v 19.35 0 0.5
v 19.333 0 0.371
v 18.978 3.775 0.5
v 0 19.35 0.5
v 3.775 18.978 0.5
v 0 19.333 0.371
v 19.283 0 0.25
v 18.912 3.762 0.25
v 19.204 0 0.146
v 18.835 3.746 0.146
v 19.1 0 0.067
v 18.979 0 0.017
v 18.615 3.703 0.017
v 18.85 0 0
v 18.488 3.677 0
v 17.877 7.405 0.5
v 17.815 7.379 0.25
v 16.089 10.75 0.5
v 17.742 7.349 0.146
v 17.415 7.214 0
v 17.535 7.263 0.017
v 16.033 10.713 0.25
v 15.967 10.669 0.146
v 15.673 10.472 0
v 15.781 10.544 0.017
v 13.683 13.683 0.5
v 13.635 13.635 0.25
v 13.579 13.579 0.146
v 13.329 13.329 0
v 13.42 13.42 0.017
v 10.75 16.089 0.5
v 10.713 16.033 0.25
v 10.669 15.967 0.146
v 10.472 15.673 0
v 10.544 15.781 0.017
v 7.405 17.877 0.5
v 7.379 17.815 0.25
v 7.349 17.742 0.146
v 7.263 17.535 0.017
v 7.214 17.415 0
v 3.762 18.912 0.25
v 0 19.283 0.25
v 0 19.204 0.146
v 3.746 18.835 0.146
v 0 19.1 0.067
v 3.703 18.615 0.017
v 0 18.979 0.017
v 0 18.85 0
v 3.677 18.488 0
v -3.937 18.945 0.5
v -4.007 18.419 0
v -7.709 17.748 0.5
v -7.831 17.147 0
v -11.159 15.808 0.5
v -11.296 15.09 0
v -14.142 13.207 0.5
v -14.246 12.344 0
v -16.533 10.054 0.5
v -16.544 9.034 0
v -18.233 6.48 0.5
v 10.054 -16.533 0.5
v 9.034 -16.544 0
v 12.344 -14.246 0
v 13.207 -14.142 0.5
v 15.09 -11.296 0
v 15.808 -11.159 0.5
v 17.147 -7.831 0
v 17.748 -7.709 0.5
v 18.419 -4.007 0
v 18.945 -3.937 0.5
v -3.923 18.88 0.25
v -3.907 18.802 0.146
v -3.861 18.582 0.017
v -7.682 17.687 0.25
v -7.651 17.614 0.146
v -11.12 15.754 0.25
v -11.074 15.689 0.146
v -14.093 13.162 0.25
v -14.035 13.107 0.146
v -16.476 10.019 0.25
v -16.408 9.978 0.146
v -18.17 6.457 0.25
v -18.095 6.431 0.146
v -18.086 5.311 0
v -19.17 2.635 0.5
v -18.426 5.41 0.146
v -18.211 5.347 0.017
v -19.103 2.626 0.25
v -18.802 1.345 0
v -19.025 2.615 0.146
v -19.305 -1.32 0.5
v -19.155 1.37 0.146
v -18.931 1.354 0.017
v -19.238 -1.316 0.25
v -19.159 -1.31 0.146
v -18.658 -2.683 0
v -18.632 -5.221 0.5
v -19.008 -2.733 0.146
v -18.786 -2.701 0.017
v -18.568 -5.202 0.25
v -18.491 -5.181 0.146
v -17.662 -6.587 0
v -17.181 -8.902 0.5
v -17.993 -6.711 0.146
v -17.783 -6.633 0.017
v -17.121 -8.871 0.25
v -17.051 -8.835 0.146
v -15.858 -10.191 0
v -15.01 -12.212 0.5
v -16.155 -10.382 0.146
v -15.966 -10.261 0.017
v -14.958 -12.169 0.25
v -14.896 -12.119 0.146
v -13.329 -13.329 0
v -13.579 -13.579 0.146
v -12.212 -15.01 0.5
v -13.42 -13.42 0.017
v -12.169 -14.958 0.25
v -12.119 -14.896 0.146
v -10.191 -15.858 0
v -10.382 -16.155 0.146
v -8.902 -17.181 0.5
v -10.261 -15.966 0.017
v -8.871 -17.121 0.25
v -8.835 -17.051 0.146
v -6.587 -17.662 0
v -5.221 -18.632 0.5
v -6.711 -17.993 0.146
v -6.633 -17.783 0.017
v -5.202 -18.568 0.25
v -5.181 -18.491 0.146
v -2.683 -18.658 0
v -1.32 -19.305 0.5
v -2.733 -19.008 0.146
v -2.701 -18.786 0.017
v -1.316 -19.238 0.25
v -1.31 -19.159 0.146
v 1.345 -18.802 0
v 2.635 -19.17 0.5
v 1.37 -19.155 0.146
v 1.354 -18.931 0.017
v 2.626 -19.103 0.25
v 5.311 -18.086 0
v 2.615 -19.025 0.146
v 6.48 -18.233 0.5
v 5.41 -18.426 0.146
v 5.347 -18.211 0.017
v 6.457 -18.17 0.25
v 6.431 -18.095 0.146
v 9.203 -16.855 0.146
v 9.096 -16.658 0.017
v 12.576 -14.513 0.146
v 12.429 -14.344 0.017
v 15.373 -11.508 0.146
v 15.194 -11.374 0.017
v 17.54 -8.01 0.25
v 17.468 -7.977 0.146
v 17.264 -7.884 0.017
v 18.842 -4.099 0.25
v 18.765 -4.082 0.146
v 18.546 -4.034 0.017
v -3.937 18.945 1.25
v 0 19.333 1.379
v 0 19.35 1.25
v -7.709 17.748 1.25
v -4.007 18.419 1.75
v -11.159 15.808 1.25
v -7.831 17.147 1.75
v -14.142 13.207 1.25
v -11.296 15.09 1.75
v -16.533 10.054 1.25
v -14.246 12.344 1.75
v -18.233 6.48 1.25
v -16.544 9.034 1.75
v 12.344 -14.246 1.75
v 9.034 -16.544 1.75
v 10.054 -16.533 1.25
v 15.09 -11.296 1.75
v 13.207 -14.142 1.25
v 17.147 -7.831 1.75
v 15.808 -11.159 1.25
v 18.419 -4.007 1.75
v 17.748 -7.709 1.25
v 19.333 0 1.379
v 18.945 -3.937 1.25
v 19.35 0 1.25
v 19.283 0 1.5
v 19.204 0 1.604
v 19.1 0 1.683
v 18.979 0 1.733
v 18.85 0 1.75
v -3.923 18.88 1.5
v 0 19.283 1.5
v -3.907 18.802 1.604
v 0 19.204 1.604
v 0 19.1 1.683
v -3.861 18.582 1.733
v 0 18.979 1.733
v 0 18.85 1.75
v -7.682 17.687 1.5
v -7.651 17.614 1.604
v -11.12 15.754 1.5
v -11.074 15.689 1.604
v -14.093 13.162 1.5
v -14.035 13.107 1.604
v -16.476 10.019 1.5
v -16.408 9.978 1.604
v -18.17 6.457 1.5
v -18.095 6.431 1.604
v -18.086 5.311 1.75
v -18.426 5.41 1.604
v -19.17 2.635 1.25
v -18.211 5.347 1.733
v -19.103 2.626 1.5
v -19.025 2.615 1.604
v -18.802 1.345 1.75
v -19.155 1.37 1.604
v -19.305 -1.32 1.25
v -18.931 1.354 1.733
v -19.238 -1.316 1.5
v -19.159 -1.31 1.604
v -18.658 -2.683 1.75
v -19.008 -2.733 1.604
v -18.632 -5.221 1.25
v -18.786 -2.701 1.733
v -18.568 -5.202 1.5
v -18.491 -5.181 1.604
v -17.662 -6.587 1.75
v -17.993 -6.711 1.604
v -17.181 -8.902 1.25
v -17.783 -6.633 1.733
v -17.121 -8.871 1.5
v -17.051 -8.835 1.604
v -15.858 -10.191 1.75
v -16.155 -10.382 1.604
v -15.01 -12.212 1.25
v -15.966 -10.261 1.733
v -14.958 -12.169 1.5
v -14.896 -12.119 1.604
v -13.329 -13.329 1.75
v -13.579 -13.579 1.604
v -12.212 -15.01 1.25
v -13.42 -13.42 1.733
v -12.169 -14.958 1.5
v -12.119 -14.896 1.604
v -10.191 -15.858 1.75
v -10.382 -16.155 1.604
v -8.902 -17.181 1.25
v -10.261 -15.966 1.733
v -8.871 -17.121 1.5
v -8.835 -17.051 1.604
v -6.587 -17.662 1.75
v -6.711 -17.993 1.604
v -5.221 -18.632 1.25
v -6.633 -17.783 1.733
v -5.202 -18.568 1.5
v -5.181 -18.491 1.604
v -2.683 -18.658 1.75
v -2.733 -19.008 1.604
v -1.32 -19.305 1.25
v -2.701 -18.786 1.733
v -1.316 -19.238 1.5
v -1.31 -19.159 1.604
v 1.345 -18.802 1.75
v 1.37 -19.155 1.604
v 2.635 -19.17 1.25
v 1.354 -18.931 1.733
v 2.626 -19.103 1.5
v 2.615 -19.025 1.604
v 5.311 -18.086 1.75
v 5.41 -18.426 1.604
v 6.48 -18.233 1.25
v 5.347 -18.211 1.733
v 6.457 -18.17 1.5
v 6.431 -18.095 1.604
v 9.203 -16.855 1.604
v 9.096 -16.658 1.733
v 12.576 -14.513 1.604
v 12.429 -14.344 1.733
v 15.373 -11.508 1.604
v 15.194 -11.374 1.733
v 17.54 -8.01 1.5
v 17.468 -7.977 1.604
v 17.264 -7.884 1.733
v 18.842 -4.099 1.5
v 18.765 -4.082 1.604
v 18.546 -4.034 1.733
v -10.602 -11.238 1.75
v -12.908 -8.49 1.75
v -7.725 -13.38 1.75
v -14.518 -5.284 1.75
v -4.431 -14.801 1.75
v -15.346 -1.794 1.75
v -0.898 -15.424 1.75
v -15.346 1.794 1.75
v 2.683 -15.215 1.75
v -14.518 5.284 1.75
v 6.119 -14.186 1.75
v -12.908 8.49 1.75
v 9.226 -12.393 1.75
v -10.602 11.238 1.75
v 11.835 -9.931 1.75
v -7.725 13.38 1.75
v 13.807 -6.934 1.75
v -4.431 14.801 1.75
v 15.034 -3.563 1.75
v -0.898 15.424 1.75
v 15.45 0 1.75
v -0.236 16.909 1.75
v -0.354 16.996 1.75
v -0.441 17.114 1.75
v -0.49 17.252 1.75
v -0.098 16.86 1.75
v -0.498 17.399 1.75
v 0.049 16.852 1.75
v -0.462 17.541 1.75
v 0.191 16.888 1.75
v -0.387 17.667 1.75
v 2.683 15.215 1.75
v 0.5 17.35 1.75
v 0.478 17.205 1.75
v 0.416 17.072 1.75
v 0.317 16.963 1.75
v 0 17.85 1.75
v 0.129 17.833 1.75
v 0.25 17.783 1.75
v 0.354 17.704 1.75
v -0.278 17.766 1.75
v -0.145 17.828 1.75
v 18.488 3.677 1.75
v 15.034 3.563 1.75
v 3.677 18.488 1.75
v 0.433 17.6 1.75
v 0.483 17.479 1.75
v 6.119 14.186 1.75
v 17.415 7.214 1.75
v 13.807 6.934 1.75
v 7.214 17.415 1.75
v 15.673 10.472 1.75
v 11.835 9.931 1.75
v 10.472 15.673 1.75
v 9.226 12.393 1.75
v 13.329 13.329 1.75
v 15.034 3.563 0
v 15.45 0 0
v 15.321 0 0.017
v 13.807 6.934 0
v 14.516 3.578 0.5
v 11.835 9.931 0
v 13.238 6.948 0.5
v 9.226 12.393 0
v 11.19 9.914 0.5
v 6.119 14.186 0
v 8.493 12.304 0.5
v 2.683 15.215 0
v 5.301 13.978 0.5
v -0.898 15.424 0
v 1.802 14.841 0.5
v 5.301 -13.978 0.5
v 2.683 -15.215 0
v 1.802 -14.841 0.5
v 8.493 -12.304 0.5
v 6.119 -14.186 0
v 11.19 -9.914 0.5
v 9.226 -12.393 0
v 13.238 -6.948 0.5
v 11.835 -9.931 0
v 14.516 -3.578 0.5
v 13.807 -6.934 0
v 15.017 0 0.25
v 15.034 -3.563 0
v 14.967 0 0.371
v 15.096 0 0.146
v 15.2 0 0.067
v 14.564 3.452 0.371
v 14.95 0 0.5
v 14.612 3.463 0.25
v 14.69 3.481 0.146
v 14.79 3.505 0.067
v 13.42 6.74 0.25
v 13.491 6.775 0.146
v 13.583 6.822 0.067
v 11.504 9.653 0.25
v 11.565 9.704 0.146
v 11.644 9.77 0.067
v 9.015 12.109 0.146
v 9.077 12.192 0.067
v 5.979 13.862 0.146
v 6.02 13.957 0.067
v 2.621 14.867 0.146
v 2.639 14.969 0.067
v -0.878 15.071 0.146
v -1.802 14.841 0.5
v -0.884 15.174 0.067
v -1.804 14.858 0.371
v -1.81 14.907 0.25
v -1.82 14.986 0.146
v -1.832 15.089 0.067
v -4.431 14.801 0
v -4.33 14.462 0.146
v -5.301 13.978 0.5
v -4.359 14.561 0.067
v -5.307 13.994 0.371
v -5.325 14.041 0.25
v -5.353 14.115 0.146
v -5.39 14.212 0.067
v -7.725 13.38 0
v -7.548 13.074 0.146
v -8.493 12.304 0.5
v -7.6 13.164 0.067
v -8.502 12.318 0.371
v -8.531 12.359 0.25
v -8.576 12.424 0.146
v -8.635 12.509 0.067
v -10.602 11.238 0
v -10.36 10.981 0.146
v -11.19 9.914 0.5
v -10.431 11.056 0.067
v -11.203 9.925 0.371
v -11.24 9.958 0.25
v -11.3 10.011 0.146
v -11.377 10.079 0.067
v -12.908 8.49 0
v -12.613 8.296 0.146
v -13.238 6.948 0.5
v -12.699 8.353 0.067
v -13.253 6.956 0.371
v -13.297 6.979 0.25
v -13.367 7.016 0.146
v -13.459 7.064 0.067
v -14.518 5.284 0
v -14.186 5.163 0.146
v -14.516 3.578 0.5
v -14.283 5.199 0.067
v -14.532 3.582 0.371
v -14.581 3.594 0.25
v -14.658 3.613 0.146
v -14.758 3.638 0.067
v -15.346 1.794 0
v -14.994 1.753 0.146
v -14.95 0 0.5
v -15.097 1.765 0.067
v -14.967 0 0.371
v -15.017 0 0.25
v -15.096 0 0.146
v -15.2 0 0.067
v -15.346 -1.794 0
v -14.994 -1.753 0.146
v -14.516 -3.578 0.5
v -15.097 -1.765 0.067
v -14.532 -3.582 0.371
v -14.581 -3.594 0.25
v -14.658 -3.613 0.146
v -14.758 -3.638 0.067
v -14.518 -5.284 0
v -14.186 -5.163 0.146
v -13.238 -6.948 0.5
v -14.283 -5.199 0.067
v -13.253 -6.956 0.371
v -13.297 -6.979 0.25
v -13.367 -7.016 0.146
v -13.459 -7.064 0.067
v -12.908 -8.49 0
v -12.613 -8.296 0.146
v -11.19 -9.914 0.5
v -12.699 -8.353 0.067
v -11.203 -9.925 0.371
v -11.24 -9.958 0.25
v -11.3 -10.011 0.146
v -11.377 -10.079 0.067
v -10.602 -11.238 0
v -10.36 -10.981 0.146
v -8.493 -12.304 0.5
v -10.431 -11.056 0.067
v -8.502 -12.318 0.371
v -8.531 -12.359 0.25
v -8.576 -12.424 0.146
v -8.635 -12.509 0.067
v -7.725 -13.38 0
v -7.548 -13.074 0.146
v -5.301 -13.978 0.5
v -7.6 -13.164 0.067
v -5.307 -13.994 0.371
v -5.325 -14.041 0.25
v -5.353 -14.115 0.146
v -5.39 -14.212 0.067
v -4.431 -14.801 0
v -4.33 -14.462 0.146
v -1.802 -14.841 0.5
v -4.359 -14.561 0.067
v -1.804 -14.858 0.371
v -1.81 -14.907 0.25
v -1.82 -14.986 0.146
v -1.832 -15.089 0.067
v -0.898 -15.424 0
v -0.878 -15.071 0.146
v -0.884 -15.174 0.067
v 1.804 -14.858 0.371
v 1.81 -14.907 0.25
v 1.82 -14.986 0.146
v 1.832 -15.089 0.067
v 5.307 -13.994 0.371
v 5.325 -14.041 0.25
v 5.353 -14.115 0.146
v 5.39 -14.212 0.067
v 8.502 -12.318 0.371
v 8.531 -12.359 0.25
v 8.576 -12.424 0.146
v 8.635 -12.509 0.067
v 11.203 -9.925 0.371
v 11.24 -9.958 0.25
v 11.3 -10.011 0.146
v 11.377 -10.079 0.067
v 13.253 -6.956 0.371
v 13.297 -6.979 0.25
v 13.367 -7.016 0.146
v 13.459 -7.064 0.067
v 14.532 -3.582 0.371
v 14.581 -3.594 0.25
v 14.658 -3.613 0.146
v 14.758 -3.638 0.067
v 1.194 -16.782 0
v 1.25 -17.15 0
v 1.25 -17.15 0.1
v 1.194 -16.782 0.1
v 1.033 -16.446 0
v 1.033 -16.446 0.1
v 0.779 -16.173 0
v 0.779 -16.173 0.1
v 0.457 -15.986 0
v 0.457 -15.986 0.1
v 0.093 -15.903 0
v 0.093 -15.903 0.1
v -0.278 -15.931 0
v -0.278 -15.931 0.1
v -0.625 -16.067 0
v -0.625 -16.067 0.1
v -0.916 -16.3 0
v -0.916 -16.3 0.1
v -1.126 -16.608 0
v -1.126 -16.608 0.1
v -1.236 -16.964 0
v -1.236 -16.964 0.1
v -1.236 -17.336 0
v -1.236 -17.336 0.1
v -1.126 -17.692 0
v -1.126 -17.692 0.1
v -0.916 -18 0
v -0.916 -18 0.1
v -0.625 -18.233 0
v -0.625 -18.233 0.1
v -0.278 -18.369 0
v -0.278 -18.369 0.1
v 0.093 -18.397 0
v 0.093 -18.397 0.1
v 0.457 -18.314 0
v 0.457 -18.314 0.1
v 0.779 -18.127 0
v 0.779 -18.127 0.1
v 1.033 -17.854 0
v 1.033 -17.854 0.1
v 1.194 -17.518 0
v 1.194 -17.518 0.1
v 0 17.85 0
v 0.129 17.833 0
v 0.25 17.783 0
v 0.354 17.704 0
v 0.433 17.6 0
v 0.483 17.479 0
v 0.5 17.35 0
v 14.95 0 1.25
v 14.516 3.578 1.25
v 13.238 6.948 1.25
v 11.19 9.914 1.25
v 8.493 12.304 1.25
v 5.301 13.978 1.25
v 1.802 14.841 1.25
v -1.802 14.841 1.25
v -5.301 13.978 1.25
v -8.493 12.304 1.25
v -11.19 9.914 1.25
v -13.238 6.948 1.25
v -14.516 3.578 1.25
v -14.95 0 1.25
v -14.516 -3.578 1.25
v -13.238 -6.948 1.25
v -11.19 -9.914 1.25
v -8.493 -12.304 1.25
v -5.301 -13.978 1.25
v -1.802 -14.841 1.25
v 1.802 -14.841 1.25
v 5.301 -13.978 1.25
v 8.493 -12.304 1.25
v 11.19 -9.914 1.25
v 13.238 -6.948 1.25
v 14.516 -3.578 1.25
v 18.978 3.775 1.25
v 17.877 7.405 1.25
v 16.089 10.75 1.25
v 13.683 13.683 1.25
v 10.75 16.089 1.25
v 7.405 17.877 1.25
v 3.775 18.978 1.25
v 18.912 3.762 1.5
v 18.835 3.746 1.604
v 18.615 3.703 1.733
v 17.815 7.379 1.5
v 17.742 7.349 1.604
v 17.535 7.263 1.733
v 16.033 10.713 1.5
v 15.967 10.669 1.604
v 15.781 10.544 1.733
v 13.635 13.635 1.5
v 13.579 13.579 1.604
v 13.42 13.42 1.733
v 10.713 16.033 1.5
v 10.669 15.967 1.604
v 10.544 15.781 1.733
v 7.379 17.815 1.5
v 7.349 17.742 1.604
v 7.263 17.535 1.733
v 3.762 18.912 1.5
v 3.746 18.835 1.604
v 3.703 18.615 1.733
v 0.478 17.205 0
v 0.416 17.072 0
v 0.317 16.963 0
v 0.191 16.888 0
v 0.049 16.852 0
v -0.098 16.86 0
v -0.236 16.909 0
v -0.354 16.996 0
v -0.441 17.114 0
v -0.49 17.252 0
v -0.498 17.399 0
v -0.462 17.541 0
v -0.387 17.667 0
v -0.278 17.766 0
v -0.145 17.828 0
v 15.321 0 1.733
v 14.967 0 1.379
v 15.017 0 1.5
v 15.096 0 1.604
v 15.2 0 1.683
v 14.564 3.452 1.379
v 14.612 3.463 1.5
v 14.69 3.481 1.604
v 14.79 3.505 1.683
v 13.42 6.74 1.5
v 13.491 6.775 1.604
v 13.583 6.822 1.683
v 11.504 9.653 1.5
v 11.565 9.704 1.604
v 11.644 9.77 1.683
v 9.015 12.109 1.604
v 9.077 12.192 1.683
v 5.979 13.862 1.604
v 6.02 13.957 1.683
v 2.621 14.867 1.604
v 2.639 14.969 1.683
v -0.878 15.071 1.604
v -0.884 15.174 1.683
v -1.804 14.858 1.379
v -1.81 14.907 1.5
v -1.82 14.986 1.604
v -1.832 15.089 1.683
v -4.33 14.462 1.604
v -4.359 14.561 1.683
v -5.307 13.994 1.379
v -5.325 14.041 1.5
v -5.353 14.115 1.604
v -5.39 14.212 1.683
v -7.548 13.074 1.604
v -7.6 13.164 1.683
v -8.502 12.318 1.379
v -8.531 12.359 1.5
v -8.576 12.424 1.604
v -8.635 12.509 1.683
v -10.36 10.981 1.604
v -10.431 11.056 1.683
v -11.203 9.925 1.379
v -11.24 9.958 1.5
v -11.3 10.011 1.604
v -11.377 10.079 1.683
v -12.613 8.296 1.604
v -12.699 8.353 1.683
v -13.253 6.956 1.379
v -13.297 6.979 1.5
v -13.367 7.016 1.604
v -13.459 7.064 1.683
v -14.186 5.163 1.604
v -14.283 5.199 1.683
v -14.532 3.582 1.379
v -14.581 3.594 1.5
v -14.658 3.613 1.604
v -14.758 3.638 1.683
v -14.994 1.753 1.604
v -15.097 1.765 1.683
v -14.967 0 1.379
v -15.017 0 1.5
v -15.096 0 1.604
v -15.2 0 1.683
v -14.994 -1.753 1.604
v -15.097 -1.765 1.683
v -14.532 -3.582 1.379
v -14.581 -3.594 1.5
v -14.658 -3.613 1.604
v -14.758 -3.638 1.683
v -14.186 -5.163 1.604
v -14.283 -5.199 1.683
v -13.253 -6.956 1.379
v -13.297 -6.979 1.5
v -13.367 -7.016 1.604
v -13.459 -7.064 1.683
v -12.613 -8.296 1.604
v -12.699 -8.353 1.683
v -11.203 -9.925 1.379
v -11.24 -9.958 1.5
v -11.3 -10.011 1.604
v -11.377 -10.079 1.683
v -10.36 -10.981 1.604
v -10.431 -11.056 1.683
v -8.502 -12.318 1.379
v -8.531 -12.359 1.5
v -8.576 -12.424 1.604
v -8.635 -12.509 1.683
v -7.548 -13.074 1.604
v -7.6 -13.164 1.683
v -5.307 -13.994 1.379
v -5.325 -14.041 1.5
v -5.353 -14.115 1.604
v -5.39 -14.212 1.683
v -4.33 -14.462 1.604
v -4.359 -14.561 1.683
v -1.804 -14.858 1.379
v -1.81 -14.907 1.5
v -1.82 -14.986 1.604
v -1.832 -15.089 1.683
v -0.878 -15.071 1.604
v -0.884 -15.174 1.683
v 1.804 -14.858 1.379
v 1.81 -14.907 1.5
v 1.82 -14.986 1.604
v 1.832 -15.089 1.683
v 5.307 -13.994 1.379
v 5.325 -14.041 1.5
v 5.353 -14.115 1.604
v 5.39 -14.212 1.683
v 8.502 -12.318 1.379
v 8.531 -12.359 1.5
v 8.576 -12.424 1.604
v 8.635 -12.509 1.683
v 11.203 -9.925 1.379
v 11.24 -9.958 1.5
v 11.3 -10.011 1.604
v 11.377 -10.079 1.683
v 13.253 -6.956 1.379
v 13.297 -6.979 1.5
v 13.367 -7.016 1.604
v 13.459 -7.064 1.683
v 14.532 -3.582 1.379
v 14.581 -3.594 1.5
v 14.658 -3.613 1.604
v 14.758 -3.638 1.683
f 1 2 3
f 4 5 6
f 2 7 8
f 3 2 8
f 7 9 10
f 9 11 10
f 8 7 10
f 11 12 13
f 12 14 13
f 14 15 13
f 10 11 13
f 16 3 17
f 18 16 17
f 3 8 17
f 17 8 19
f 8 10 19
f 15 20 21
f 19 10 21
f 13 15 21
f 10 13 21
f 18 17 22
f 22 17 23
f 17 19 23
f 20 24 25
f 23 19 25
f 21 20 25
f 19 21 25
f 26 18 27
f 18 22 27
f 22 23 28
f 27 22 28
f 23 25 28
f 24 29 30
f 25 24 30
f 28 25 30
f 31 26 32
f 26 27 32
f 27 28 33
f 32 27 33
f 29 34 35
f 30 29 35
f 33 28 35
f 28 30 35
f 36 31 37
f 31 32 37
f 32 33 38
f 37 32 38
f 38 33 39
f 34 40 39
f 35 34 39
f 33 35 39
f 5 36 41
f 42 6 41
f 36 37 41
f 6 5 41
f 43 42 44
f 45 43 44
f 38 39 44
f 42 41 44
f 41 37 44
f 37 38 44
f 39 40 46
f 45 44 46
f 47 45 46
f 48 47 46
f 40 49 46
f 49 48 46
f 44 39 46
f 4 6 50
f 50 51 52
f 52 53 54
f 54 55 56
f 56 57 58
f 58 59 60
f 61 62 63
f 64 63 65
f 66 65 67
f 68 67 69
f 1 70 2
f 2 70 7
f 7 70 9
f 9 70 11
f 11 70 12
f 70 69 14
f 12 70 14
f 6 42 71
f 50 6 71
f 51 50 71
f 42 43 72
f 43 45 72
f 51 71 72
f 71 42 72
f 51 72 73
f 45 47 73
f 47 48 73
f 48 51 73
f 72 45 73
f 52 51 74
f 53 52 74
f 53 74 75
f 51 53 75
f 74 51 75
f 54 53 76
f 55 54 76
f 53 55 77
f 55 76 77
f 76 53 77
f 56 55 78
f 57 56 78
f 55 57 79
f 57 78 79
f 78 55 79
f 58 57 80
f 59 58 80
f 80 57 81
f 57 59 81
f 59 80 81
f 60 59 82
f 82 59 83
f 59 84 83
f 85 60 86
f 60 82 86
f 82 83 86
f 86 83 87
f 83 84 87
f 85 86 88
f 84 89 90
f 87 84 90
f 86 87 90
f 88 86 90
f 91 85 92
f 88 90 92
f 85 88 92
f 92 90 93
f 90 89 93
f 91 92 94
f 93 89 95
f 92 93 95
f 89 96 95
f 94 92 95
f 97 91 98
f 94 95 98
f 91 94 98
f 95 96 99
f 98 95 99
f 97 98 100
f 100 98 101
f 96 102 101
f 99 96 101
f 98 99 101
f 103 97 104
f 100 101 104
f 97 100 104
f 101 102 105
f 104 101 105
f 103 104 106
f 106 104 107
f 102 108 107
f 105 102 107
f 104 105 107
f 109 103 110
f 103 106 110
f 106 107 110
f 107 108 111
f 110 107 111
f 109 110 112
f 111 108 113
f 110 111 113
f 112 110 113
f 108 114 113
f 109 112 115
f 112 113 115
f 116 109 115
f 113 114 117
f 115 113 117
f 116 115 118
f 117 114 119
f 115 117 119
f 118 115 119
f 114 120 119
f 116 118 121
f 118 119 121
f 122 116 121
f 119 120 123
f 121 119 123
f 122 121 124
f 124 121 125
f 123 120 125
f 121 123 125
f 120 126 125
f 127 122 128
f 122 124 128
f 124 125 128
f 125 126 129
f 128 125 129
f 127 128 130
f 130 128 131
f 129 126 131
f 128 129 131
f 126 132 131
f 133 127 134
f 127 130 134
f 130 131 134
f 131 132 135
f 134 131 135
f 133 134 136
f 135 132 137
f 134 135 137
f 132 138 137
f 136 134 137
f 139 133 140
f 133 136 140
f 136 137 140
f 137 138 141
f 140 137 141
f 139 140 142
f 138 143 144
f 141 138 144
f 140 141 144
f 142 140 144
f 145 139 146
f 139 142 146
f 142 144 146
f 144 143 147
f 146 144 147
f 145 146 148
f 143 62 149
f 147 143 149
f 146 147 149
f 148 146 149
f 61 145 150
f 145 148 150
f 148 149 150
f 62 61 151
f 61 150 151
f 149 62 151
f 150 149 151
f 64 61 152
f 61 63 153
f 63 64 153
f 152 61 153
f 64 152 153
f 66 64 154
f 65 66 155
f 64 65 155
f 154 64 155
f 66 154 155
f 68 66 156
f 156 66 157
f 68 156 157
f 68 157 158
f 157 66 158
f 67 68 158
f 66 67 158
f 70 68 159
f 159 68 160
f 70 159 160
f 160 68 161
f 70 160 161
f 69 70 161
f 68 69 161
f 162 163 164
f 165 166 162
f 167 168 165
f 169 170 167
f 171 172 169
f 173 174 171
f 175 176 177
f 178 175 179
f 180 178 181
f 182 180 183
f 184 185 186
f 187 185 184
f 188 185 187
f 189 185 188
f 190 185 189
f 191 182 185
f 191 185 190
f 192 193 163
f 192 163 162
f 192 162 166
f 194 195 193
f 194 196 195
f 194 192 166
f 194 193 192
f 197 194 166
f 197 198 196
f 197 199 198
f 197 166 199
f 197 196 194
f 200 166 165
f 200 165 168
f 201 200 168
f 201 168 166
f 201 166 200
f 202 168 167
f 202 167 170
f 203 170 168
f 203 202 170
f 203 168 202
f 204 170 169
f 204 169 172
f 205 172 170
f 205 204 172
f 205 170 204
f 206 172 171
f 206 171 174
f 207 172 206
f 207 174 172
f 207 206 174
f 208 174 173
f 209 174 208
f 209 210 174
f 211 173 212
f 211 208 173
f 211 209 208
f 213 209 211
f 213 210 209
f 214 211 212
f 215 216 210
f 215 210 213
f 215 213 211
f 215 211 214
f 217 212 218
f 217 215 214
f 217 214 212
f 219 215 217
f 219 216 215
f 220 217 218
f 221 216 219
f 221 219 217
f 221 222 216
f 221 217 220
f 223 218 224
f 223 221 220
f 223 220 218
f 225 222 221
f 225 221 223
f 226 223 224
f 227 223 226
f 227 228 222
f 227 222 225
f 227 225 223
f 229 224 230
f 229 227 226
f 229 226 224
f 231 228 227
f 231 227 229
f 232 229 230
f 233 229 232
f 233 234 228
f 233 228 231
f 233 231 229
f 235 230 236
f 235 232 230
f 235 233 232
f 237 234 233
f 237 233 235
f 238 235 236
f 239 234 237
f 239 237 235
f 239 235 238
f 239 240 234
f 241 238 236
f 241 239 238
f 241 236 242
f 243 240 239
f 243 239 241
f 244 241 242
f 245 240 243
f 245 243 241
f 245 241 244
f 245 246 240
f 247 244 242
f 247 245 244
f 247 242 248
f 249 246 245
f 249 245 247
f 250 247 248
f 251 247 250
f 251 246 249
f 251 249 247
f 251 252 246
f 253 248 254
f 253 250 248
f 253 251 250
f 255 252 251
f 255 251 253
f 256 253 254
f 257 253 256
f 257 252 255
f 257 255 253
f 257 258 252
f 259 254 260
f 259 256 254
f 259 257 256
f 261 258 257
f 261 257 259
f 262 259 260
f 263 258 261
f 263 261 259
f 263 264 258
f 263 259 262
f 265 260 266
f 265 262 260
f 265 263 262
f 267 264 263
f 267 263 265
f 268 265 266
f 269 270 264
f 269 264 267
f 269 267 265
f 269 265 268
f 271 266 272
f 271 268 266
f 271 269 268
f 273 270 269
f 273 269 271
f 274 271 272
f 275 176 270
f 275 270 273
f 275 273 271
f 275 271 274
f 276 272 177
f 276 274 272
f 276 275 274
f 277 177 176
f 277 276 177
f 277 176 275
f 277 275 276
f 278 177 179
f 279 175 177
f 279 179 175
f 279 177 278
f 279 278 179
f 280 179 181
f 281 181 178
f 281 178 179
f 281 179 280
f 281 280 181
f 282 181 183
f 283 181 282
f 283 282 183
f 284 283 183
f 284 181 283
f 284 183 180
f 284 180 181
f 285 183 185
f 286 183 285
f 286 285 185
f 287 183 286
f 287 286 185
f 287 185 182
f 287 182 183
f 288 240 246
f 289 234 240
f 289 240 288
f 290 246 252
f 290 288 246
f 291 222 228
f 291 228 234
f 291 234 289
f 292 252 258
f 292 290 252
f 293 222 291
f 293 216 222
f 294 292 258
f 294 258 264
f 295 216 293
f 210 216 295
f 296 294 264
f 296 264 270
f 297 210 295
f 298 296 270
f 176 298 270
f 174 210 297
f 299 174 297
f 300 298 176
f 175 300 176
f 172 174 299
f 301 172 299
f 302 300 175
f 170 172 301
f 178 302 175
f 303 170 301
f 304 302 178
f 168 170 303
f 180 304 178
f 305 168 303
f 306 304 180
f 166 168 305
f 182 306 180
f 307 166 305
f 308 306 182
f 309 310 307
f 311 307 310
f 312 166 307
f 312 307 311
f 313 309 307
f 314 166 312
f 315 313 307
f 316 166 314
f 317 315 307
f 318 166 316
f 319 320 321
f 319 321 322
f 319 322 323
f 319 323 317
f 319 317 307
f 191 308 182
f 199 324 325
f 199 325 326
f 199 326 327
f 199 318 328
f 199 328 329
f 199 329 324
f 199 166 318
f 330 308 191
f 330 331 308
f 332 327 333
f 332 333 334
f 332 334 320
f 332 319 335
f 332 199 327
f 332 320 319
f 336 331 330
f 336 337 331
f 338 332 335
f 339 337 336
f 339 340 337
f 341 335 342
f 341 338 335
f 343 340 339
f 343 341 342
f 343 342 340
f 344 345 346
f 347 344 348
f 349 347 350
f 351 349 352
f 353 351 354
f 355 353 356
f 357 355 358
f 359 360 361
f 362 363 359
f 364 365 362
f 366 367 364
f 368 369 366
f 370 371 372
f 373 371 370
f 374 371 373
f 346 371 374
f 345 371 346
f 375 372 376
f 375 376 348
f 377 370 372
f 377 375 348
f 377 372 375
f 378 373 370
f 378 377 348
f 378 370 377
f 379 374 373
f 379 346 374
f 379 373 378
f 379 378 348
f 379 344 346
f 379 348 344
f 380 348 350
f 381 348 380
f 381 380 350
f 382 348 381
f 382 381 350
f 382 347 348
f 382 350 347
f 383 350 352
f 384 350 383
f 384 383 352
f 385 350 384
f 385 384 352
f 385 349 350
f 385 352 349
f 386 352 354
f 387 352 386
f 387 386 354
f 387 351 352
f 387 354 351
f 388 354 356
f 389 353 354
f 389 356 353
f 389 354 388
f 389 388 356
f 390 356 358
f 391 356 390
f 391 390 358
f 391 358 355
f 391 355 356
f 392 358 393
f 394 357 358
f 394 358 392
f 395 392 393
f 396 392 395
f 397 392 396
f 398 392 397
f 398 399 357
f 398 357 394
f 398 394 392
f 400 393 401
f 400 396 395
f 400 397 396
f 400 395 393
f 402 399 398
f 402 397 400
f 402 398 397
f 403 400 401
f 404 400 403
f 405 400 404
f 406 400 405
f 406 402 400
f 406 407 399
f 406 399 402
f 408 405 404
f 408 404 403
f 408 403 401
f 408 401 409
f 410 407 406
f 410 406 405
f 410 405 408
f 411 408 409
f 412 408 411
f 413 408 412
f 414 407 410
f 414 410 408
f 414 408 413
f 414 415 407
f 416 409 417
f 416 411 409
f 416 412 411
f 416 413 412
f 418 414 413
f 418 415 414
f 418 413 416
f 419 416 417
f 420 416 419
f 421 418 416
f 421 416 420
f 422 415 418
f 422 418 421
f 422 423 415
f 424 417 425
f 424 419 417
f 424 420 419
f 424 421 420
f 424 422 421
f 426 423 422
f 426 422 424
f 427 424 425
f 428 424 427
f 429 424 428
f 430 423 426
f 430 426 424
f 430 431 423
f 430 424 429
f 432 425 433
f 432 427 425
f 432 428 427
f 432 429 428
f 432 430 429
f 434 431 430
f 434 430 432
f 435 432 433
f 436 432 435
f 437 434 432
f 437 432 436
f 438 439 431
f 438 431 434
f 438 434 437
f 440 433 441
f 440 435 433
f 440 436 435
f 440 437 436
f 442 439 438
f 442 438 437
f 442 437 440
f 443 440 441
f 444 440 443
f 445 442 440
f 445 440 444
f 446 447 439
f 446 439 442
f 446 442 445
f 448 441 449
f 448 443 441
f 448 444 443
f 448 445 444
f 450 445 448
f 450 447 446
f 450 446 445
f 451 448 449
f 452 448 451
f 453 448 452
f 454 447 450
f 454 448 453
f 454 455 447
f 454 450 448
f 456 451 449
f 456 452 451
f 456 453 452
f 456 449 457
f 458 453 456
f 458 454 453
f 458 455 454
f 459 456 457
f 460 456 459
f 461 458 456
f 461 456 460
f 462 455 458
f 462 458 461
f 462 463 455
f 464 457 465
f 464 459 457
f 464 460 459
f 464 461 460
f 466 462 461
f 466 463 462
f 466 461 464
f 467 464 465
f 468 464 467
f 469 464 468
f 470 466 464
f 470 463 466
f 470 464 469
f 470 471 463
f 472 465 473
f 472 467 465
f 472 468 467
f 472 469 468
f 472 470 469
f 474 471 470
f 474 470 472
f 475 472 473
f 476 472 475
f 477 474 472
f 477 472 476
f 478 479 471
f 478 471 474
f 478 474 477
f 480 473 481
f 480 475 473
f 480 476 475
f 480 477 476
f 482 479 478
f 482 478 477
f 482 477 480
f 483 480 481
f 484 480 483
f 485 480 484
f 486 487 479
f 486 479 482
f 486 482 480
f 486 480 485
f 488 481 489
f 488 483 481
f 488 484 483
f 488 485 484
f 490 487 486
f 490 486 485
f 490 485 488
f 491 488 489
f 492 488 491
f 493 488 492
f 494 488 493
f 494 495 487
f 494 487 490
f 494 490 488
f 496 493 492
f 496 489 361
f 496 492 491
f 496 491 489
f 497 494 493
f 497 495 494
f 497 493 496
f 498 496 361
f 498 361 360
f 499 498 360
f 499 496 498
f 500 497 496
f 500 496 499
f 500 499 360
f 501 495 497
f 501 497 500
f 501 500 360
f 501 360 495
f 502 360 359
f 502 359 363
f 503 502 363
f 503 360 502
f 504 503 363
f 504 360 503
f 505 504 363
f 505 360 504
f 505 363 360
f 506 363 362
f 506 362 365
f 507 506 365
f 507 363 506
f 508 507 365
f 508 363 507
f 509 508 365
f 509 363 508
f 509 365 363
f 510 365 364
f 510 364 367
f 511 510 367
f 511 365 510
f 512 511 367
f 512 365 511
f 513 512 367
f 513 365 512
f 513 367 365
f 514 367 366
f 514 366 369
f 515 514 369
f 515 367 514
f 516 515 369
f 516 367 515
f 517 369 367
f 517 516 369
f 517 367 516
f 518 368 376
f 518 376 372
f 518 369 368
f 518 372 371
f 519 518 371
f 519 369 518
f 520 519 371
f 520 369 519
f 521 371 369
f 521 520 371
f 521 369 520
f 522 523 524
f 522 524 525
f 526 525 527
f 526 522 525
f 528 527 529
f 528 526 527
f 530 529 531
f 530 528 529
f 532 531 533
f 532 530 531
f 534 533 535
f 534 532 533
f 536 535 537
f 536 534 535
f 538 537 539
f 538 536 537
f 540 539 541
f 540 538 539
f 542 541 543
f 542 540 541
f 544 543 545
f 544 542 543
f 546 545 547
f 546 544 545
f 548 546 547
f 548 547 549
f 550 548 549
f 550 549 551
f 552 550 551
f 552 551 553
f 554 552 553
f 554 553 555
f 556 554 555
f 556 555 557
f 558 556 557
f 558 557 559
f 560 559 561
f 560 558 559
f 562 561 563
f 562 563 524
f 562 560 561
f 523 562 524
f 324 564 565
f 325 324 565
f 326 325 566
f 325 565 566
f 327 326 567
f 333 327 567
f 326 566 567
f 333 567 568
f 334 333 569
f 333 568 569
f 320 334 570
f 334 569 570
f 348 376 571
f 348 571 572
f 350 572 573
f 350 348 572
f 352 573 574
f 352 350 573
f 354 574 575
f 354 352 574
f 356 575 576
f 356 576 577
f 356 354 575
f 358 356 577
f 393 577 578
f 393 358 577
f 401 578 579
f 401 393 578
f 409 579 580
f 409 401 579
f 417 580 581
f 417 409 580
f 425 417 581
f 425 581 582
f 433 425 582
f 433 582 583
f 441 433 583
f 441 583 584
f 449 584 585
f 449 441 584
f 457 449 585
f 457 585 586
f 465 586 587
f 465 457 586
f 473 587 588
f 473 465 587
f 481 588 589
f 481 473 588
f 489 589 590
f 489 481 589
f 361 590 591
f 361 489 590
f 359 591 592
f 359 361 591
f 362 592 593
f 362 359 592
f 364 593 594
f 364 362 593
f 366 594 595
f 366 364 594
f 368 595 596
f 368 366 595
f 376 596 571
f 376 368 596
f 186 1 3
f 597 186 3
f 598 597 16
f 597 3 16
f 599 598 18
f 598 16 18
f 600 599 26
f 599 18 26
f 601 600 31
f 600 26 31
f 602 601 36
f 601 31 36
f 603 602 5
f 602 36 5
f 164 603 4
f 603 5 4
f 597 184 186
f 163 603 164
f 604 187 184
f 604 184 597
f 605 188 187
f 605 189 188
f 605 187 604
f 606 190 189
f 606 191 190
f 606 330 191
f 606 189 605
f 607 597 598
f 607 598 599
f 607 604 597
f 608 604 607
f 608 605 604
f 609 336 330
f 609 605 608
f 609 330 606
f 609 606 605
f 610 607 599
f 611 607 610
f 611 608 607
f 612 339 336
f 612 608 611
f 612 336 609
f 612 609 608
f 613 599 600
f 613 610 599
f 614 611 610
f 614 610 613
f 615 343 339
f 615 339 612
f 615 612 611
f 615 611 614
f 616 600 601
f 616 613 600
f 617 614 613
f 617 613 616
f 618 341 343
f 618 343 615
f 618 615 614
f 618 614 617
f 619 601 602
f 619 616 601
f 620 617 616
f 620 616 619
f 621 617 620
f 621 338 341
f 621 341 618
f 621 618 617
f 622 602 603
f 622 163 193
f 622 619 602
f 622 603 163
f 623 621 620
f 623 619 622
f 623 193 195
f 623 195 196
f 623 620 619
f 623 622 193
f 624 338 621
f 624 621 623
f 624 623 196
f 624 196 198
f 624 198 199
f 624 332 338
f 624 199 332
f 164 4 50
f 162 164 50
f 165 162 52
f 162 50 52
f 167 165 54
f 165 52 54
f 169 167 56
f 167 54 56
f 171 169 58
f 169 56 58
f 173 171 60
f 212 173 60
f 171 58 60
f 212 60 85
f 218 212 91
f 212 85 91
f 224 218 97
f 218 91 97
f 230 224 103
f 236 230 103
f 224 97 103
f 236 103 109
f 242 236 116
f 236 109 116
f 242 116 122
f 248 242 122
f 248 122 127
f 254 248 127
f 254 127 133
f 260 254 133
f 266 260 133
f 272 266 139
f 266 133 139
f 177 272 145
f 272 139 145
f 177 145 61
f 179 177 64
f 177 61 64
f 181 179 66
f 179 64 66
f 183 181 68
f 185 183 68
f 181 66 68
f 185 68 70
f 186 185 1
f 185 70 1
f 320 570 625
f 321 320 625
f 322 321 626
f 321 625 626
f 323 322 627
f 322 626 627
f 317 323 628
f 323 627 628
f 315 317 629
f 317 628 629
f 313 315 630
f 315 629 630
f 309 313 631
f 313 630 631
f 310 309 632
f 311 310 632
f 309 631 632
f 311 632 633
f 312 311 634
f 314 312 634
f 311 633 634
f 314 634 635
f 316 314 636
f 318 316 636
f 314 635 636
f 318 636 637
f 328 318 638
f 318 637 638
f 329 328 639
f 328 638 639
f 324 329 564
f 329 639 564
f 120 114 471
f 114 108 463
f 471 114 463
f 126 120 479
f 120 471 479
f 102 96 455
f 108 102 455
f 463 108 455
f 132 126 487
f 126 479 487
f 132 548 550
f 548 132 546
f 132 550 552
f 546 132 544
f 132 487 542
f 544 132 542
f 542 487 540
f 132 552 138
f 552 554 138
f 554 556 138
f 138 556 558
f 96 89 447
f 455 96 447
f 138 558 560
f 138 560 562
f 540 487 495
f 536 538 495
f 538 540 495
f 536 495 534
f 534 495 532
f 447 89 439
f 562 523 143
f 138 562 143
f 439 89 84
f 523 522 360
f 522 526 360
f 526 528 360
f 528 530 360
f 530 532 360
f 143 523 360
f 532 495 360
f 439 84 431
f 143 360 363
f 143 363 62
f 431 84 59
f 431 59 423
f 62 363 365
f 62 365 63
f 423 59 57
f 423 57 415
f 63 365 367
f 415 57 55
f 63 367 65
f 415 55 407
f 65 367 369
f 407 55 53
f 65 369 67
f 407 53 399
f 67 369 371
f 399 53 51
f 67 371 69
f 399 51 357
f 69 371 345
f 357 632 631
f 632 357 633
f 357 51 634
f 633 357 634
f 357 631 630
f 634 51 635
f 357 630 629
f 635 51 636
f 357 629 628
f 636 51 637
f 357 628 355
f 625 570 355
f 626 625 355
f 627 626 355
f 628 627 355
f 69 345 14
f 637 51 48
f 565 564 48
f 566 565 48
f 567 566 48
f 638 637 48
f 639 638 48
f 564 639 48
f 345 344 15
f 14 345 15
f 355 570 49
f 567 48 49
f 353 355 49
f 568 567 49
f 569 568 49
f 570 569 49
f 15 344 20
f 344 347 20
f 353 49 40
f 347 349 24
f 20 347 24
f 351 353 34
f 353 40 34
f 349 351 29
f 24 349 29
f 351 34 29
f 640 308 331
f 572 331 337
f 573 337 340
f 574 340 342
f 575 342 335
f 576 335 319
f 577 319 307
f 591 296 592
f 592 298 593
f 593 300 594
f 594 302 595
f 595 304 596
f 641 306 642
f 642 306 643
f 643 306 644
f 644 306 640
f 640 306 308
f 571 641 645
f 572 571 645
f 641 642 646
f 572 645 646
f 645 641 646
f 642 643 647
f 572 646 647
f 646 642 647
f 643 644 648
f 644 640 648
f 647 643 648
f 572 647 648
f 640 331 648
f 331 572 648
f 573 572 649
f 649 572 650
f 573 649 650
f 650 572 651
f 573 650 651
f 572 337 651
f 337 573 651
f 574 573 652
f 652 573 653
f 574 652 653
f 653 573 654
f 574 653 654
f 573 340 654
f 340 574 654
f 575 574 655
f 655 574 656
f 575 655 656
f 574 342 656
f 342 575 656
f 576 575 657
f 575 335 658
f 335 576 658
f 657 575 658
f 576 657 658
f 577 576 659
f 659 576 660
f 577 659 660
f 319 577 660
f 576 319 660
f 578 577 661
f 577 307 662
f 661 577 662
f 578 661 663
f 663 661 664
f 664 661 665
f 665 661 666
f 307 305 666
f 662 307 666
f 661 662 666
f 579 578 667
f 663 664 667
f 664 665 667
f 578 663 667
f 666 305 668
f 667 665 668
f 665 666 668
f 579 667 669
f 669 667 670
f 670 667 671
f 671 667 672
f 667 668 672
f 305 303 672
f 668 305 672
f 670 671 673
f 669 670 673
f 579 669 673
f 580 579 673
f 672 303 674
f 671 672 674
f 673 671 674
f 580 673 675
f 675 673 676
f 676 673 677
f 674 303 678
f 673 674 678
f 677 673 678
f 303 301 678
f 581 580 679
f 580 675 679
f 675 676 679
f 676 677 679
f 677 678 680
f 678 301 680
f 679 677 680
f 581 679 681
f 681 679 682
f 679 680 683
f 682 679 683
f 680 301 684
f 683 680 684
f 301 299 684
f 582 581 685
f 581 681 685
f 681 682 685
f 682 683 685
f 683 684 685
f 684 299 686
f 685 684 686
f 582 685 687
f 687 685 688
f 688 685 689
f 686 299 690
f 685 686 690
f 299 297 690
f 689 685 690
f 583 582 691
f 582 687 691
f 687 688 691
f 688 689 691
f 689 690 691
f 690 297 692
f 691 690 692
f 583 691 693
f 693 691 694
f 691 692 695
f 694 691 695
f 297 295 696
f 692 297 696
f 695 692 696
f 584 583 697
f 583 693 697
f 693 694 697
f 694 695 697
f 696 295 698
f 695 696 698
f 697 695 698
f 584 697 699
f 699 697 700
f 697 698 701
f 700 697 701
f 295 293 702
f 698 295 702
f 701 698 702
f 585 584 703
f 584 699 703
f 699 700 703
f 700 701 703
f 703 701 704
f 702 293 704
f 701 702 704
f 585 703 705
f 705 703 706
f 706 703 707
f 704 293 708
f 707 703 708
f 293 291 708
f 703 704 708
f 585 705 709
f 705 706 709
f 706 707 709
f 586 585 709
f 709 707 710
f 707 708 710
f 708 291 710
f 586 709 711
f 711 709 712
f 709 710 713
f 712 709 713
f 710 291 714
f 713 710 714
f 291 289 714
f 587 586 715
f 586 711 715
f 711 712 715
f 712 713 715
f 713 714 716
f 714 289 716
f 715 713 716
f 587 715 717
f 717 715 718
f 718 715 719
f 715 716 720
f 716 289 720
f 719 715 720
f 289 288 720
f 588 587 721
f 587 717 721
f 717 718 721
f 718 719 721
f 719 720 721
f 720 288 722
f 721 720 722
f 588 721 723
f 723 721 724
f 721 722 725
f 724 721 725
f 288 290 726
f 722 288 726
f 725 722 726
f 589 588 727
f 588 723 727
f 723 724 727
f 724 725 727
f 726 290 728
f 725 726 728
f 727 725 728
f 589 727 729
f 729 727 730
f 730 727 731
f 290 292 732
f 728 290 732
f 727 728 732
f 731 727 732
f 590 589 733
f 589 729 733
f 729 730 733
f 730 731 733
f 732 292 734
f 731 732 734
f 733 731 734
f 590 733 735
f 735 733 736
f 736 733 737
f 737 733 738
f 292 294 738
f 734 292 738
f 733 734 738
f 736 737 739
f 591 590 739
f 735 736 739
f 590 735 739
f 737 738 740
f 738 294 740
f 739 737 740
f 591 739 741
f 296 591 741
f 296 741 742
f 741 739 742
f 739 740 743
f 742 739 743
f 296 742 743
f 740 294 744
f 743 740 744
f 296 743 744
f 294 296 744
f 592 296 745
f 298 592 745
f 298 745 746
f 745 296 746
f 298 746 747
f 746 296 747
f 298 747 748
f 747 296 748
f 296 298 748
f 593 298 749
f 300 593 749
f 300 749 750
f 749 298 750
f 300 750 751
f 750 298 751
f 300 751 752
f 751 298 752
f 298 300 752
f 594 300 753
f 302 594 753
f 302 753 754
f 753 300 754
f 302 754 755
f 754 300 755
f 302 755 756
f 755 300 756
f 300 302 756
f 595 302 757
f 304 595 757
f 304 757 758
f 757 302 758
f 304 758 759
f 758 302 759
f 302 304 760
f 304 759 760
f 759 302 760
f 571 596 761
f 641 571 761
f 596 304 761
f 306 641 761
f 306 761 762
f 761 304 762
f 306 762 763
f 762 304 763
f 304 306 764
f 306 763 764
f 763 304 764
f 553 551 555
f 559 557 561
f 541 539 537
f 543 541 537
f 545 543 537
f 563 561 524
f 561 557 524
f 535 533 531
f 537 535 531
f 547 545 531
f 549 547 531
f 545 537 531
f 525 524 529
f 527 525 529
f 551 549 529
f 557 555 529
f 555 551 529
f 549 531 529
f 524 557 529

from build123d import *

# Parameters (mm, degrees)
F0_R     = 1.25
F0_R_2   = 14.95
F1_DEPTH = 1.75
F2_R     = 0.5
F3_DEPTH = 0.1


with BuildPart() as f1:
    # F0 (on Top) → F1 (new body)
    with BuildSketch(Plane.XY):
        with BuildLine():
            ThreePointArc((0, 19.35), (-13.682516, -13.682516), (19.35, 0))
            ThreePointArc((19.35, 0), (13.682516, 13.682516), (0, 19.35))
        make_face()
        with Locations((0, -17.15)):
            Circle(F0_R, mode=Mode.SUBTRACT)
        Circle(F0_R_2, mode=Mode.SUBTRACT)
        with BuildLine():
            ThreePointArc((0.5, 17.35), (-0.353553, 16.996447), (0, 17.85))
            ThreePointArc((0, 17.85), (0.353553, 17.703553), (0.5, 17.35))
        make_face(mode=Mode.SUBTRACT)
        with Locations((0, -17.15)):
            Circle(F0_R)
    extrude(amount=F1_DEPTH)

    # F2
    f2_edges = [f1.edges().sort_by_distance(p)[0] for p in [
        (-19.35, 0, 1.75),
        (-14.95, 0, 1.75),
        (-19.35, 0, 0),
        (-14.95, 0, 0),
    ]]
    fillet(f2_edges, radius=F2_R)

    # F0 (on Top) → F3 (cut)
    with BuildSketch(Plane.XY):
        with Locations((0, -17.15)):
            Circle(F0_R)
    extrude(amount=F3_DEPTH, mode=Mode.SUBTRACT)


solid = f1.part
